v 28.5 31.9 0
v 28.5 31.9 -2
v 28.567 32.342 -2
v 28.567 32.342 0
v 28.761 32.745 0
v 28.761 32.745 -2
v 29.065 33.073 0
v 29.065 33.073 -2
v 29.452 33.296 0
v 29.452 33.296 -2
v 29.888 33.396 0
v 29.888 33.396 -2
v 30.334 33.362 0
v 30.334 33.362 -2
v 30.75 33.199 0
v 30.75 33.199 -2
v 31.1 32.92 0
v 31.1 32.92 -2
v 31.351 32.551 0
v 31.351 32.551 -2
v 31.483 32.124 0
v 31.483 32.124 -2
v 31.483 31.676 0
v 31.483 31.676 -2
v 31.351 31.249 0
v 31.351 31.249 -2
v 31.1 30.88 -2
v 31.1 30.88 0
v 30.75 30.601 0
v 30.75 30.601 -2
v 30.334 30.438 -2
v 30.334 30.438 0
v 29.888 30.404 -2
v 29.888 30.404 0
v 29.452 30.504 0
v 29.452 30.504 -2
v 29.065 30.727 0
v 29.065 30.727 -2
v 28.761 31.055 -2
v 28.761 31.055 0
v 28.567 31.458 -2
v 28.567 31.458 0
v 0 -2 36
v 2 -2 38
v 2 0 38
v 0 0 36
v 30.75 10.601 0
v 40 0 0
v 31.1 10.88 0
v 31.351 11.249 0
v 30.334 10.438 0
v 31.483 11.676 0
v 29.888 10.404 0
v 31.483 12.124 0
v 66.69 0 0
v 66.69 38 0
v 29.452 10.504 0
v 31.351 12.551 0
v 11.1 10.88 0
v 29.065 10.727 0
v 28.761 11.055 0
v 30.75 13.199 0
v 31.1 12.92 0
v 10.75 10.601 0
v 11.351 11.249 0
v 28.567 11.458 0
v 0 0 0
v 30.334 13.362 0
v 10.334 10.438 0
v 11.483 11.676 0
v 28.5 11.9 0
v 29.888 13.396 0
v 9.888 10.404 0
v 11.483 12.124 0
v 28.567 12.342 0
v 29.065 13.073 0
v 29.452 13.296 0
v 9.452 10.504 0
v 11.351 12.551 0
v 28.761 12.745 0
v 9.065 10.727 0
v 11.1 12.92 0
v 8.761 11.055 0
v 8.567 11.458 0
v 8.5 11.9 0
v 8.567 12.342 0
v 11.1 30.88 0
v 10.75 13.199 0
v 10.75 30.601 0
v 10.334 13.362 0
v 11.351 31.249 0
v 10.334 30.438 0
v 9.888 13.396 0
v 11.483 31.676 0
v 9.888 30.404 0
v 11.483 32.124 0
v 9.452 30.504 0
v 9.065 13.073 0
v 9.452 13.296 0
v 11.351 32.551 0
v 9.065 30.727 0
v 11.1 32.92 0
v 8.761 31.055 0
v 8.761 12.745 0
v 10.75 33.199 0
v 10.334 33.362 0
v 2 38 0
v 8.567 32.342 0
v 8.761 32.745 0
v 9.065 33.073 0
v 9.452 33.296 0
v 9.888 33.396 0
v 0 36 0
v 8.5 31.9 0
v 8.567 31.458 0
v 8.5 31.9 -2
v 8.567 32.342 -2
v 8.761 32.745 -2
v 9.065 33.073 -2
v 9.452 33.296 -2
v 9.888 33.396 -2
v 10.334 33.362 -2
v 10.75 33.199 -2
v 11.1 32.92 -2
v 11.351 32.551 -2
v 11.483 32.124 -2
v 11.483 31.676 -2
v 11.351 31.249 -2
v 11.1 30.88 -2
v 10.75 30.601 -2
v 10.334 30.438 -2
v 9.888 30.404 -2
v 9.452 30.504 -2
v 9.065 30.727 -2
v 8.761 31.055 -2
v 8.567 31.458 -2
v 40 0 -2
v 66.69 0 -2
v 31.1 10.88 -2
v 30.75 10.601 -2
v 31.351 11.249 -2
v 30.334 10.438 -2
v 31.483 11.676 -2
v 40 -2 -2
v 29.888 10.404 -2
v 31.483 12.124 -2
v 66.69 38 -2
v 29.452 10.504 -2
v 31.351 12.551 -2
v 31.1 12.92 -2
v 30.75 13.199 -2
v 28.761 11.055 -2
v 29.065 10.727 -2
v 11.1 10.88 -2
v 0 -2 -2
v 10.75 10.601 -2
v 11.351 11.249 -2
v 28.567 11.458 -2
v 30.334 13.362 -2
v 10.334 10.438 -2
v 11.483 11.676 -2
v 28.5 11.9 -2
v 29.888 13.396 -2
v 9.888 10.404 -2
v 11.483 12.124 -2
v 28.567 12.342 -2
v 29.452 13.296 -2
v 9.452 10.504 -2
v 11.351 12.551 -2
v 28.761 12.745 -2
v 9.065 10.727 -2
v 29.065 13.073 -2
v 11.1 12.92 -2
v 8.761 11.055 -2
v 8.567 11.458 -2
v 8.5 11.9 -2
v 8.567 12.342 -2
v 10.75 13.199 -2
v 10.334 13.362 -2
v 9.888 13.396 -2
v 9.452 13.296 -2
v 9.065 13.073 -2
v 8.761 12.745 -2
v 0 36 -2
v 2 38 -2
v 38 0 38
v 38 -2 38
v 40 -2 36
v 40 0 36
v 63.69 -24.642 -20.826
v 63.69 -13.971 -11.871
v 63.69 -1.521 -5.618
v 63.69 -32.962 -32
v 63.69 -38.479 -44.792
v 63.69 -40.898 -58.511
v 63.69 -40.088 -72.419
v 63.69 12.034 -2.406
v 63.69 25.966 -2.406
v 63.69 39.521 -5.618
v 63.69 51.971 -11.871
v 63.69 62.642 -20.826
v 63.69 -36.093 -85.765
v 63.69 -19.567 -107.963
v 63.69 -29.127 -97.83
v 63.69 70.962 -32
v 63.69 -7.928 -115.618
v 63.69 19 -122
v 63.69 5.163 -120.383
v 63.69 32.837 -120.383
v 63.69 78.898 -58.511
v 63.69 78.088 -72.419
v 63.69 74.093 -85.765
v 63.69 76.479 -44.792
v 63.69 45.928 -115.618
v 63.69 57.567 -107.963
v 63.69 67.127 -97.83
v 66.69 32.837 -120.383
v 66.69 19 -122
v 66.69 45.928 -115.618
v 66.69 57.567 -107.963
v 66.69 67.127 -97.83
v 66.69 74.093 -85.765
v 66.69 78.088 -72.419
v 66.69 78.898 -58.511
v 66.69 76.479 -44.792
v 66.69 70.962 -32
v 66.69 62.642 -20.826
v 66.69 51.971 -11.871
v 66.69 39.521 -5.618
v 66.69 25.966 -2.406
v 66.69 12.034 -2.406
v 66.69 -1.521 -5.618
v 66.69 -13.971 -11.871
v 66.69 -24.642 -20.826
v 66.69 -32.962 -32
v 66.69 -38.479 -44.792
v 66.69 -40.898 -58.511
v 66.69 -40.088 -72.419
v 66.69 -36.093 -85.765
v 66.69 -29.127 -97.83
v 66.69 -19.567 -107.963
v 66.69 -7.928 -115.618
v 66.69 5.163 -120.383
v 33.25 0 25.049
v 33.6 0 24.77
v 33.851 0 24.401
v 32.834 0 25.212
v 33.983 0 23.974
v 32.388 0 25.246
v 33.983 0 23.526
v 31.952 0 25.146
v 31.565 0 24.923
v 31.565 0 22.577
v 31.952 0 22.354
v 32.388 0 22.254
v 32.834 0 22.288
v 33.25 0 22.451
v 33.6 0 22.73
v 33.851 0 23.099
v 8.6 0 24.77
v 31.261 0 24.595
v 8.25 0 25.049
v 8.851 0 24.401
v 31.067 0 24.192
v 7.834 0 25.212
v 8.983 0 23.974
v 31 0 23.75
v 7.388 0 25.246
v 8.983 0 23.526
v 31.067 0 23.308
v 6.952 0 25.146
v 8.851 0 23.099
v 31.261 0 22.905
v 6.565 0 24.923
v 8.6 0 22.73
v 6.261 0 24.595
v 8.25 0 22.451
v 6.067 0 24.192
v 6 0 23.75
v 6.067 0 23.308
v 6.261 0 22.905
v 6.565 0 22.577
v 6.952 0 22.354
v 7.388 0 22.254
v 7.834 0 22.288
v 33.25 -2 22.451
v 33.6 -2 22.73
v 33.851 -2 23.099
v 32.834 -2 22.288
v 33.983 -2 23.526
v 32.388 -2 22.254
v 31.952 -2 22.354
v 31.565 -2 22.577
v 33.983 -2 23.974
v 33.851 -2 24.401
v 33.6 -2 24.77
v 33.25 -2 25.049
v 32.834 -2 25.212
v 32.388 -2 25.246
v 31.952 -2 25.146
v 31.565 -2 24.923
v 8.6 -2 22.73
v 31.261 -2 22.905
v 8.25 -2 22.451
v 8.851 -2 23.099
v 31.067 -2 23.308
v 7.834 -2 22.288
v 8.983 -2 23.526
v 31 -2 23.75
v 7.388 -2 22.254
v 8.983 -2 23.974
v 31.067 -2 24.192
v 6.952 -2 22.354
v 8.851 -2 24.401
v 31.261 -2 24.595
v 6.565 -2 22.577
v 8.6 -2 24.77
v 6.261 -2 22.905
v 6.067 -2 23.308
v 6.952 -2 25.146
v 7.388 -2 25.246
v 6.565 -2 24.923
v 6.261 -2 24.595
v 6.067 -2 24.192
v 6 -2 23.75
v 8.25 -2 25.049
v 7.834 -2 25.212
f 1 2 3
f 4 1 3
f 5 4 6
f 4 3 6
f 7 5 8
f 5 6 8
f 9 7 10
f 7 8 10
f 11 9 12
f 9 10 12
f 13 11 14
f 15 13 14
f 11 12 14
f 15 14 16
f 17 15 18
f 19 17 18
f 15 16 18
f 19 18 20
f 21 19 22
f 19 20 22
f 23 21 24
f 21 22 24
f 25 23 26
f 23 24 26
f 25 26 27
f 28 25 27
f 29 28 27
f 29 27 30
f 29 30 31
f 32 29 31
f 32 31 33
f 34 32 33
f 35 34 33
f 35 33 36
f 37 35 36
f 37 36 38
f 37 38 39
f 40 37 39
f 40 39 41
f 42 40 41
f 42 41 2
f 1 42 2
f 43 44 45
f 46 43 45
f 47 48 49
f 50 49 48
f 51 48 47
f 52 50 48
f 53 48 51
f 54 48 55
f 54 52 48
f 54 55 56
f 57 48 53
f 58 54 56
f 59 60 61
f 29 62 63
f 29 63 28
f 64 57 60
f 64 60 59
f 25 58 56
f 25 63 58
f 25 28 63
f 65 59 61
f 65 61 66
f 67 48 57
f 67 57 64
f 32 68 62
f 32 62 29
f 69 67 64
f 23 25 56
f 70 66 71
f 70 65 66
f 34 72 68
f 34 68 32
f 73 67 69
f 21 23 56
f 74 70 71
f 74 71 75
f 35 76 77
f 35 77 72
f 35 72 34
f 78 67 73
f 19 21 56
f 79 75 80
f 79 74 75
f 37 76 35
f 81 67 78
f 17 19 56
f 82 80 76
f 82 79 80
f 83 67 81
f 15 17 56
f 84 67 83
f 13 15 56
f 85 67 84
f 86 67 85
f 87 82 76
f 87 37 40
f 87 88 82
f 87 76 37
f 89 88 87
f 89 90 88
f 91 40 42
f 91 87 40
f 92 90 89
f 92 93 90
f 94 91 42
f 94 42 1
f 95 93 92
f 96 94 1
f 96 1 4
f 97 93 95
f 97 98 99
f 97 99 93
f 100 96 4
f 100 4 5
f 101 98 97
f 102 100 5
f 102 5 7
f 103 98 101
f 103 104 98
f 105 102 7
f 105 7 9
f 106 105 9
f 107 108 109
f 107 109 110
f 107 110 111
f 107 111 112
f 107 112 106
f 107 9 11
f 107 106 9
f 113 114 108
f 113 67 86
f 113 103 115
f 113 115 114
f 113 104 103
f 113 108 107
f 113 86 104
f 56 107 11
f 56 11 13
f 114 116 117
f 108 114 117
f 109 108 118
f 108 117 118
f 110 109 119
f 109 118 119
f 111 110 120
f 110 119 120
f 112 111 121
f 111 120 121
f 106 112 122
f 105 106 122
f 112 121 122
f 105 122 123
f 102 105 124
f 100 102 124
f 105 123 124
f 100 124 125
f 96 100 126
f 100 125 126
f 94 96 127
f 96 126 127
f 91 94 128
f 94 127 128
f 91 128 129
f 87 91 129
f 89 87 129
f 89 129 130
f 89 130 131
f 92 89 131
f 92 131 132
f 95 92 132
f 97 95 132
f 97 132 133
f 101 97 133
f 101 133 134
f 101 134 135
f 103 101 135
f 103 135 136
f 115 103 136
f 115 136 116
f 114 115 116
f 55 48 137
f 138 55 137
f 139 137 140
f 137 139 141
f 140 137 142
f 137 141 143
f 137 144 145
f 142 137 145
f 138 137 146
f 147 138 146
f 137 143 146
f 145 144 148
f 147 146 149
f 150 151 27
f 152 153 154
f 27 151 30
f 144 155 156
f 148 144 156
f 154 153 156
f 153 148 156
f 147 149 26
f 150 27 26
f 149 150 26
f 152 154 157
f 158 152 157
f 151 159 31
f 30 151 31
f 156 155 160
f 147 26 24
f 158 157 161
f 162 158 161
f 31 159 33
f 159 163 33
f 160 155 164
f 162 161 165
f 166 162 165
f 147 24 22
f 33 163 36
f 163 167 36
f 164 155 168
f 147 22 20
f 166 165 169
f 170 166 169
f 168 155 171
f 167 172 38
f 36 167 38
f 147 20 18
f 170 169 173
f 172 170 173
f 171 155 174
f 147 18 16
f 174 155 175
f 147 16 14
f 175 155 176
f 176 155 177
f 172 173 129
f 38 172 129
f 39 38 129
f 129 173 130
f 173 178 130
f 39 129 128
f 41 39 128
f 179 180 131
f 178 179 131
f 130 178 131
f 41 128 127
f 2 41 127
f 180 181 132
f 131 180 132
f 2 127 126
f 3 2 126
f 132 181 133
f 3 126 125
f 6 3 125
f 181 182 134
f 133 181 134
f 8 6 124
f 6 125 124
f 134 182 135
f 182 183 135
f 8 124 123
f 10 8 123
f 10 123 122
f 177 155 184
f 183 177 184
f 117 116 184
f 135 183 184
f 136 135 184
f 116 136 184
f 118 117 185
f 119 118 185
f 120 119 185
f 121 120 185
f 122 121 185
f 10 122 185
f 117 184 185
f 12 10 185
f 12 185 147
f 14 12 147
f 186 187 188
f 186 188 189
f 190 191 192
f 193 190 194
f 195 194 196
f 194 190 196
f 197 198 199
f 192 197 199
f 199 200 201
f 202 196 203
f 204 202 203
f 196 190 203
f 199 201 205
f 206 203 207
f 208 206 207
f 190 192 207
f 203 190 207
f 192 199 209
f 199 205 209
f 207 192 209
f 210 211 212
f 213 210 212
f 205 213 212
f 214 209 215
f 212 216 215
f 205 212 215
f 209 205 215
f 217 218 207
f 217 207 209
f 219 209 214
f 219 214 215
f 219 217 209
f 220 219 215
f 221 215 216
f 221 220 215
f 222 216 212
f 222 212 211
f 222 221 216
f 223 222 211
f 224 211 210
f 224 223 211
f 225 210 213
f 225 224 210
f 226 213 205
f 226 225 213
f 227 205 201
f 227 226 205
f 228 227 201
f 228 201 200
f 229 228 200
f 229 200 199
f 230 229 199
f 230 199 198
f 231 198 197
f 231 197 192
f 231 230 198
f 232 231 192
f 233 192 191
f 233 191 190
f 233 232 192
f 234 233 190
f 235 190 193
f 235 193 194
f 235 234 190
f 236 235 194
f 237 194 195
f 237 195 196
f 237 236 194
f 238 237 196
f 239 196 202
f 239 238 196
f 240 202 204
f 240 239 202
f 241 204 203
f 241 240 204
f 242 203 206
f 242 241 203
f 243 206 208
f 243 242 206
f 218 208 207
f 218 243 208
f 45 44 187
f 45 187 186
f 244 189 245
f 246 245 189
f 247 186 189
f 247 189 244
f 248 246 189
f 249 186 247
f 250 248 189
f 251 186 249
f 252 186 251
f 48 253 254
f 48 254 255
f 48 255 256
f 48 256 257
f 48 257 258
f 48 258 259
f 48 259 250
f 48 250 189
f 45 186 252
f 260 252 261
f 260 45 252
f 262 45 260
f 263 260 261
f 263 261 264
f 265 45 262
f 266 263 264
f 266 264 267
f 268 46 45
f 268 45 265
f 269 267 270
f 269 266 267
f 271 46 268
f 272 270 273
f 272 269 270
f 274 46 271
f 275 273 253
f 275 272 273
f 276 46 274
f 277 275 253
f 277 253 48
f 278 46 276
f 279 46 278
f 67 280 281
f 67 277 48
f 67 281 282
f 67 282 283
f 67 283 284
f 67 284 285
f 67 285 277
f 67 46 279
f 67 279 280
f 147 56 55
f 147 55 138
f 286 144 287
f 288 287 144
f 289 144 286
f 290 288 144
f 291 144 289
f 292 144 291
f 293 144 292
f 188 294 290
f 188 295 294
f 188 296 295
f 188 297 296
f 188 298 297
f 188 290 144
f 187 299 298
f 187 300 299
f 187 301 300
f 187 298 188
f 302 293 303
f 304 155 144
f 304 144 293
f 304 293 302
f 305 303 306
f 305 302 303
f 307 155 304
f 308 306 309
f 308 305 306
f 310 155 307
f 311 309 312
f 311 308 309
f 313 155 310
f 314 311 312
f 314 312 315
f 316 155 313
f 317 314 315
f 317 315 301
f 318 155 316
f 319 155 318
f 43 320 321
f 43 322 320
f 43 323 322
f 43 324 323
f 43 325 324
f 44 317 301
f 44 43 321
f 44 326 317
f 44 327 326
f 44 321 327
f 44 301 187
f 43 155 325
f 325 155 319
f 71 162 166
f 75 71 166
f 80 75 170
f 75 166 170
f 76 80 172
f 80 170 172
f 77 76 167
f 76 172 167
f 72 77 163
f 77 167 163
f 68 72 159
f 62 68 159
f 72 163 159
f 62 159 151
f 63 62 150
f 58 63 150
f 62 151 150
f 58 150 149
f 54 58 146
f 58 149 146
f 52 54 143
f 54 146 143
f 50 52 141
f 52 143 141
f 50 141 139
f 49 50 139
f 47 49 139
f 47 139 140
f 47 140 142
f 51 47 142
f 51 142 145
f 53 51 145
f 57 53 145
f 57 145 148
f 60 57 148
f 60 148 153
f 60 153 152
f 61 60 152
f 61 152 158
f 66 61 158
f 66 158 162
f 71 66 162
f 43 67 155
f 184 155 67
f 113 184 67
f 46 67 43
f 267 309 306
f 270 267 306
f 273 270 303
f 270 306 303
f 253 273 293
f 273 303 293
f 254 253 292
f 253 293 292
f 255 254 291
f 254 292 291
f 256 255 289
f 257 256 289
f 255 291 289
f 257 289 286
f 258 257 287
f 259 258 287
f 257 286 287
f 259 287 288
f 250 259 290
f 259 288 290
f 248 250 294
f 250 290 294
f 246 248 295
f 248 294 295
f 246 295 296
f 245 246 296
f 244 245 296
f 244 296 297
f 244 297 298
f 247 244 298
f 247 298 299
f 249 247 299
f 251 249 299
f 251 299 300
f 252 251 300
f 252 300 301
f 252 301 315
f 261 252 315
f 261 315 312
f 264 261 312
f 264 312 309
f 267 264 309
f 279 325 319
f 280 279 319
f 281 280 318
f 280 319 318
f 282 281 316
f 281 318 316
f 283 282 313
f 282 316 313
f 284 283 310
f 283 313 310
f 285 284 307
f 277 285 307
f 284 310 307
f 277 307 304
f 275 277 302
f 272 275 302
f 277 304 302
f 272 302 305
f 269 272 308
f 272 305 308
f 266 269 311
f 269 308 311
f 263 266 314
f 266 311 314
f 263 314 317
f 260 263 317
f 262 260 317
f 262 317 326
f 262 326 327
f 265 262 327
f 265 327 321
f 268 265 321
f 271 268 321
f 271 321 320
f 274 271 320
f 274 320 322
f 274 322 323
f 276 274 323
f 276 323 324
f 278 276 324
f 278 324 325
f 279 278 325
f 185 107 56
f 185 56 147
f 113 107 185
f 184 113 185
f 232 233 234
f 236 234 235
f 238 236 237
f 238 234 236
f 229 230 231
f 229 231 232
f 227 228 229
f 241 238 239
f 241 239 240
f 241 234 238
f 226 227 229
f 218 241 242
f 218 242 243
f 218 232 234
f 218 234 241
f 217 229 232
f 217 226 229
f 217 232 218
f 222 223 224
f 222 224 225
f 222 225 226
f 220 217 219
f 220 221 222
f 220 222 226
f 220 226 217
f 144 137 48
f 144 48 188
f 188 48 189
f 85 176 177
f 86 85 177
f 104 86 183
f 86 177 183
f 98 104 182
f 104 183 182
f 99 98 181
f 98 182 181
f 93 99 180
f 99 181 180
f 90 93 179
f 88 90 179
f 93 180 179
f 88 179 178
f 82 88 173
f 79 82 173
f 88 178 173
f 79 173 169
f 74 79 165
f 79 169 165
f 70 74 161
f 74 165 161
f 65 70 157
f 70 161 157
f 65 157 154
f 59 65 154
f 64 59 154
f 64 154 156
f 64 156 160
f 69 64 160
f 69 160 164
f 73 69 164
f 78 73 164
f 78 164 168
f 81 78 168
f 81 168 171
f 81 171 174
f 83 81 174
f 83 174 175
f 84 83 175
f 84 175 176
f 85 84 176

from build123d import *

# Parameters (mm, degrees)
EXTRUDE1_DEPTH           = 40
EXTRUDE2_REACH           = 42
SKETCH2_R                = 1.5
EXTRUDE3_REACH           = 42
SKETCH3_R                = 1.5
CHAMFER1_SIZE            = 2
SKETCH4_W                = 2
SKETCH4_H                = 38
BOSS_EXTRUDE1_DEPTH      = 26.69
BOSS_EXTRUDE1_DEPTH_BACK = 3
SKETCH5_R                = 60
BOSS_EXTRUDE2_DEPTH      = 3


with BuildPart() as part:
    # Sketch1 → Extrude1 (new body)
    with BuildSketch(Plane(origin=(0, 0, 0), x_dir=(0, 0, -1), z_dir=(1, 0, 0))):
        Polygon((0, 0), (0, 38), (2, 38), (2, -2), (-38, -2), (-38, 0), align=None)
    extrude(amount=EXTRUDE1_DEPTH)

    # Sketch2 → Extrude2 (cut, up to next)
    with BuildSketch(Plane(origin=(0, -2, 0), x_dir=(-1, 0, 0), z_dir=(0, -1, 0)), mode=Mode.PRIVATE) as extrude2_sk1:
        with Locations((-32.5, -23.75)):
            Circle(SKETCH2_R)
    extrude2_tool1 = extrude(extrude2_sk1.sketch, amount=-EXTRUDE2_REACH, mode=Mode.PRIVATE) & part.part
    add(extrude2_tool1.solids().sort_by_distance((32.5, -2, 23.75))[0], mode=Mode.SUBTRACT)
    # Sketch2 → Extrude2 (cut, up to next)
    with BuildSketch(Plane(origin=(0, -2, 0), x_dir=(-1, 0, 0), z_dir=(0, -1, 0)), mode=Mode.PRIVATE) as extrude2_sk2:
        with Locations((-7.5, -23.75)):
            Circle(SKETCH2_R)
    extrude2_tool2 = extrude(extrude2_sk2.sketch, amount=-EXTRUDE2_REACH, mode=Mode.PRIVATE) & part.part
    add(extrude2_tool2.solids().sort_by_distance((7.5, -2, 23.75))[0], mode=Mode.SUBTRACT)

    # Sketch3 → Extrude3 (cut, up to next)
    with BuildSketch(Plane(origin=(0, 0, -2), x_dir=(-1, 0, 0), z_dir=(0, 0, -1)), mode=Mode.PRIVATE) as extrude3_sk1:
        with Locations((-10, 31.9)):
            Circle(SKETCH3_R)
    extrude3_tool1 = extrude(extrude3_sk1.sketch, amount=-EXTRUDE3_REACH, mode=Mode.PRIVATE) & part.part
    add(extrude3_tool1.solids().sort_by_distance((10, 31.9, -2))[0], mode=Mode.SUBTRACT)
    # Sketch3 → Extrude3 (cut, up to next)
    with BuildSketch(Plane(origin=(0, 0, -2), x_dir=(-1, 0, 0), z_dir=(0, 0, -1)), mode=Mode.PRIVATE) as extrude3_sk2:
        with Locations((-30, 31.9)):
            Circle(SKETCH3_R)
    extrude3_tool2 = extrude(extrude3_sk2.sketch, amount=-EXTRUDE3_REACH, mode=Mode.PRIVATE) & part.part
    add(extrude3_tool2.solids().sort_by_distance((30, 31.9, -2))[0], mode=Mode.SUBTRACT)
    # Sketch3 → Extrude3 (cut, up to next)
    with BuildSketch(Plane(origin=(0, 0, -2), x_dir=(-1, 0, 0), z_dir=(0, 0, -1)), mode=Mode.PRIVATE) as extrude3_sk3:
        with Locations((-30, 11.9)):
            Circle(SKETCH3_R)
    extrude3_tool3 = extrude(extrude3_sk3.sketch, amount=-EXTRUDE3_REACH, mode=Mode.PRIVATE) & part.part
    add(extrude3_tool3.solids().sort_by_distance((30, 11.9, -2))[0], mode=Mode.SUBTRACT)
    # Sketch3 → Extrude3 (cut, up to next)
    with BuildSketch(Plane(origin=(0, 0, -2), x_dir=(-1, 0, 0), z_dir=(0, 0, -1)), mode=Mode.PRIVATE) as extrude3_sk4:
        with Locations((-10, 11.9)):
            Circle(SKETCH3_R)
    extrude3_tool4 = extrude(extrude3_sk4.sketch, amount=-EXTRUDE3_REACH, mode=Mode.PRIVATE) & part.part
    add(extrude3_tool4.solids().sort_by_distance((10, 11.9, -2))[0], mode=Mode.SUBTRACT)

    # Chamfer1
    chamfer1_edges = [part.edges().sort_by_distance(p)[0] for p in [
        (40, 38, -1),
        (0, 38, -1),
        (40, -1, 38),
        (0, -1, 38),
    ]]
    chamfer(chamfer1_edges, length=CHAMFER1_SIZE)

    # Sketch4 → Boss-Extrude1 (add, two sides)
    with BuildSketch(Plane(origin=(40, 0, 0), x_dir=(0, 0, -1), z_dir=(1, 0, 0))) as boss_extrude1_sk:
        with Locations((1, 19)):
            Rectangle(SKETCH4_W, SKETCH4_H)
    extrude(amount=BOSS_EXTRUDE1_DEPTH)
    extrude(boss_extrude1_sk.sketch, amount=-BOSS_EXTRUDE1_DEPTH_BACK)


with BuildPart() as body_2:
    # Sketch5 → Boss-Extrude2 (new body)
    with BuildSketch(Plane(origin=(66.69, 0, 0), x_dir=(0, 0, -1), z_dir=(1, 0, 0))):
        with Locations((62, 19)):
            Circle(SKETCH5_R)
    extrude(amount=-BOSS_EXTRUDE2_DEPTH)


solid = Compound([part.part, body_2.part])
